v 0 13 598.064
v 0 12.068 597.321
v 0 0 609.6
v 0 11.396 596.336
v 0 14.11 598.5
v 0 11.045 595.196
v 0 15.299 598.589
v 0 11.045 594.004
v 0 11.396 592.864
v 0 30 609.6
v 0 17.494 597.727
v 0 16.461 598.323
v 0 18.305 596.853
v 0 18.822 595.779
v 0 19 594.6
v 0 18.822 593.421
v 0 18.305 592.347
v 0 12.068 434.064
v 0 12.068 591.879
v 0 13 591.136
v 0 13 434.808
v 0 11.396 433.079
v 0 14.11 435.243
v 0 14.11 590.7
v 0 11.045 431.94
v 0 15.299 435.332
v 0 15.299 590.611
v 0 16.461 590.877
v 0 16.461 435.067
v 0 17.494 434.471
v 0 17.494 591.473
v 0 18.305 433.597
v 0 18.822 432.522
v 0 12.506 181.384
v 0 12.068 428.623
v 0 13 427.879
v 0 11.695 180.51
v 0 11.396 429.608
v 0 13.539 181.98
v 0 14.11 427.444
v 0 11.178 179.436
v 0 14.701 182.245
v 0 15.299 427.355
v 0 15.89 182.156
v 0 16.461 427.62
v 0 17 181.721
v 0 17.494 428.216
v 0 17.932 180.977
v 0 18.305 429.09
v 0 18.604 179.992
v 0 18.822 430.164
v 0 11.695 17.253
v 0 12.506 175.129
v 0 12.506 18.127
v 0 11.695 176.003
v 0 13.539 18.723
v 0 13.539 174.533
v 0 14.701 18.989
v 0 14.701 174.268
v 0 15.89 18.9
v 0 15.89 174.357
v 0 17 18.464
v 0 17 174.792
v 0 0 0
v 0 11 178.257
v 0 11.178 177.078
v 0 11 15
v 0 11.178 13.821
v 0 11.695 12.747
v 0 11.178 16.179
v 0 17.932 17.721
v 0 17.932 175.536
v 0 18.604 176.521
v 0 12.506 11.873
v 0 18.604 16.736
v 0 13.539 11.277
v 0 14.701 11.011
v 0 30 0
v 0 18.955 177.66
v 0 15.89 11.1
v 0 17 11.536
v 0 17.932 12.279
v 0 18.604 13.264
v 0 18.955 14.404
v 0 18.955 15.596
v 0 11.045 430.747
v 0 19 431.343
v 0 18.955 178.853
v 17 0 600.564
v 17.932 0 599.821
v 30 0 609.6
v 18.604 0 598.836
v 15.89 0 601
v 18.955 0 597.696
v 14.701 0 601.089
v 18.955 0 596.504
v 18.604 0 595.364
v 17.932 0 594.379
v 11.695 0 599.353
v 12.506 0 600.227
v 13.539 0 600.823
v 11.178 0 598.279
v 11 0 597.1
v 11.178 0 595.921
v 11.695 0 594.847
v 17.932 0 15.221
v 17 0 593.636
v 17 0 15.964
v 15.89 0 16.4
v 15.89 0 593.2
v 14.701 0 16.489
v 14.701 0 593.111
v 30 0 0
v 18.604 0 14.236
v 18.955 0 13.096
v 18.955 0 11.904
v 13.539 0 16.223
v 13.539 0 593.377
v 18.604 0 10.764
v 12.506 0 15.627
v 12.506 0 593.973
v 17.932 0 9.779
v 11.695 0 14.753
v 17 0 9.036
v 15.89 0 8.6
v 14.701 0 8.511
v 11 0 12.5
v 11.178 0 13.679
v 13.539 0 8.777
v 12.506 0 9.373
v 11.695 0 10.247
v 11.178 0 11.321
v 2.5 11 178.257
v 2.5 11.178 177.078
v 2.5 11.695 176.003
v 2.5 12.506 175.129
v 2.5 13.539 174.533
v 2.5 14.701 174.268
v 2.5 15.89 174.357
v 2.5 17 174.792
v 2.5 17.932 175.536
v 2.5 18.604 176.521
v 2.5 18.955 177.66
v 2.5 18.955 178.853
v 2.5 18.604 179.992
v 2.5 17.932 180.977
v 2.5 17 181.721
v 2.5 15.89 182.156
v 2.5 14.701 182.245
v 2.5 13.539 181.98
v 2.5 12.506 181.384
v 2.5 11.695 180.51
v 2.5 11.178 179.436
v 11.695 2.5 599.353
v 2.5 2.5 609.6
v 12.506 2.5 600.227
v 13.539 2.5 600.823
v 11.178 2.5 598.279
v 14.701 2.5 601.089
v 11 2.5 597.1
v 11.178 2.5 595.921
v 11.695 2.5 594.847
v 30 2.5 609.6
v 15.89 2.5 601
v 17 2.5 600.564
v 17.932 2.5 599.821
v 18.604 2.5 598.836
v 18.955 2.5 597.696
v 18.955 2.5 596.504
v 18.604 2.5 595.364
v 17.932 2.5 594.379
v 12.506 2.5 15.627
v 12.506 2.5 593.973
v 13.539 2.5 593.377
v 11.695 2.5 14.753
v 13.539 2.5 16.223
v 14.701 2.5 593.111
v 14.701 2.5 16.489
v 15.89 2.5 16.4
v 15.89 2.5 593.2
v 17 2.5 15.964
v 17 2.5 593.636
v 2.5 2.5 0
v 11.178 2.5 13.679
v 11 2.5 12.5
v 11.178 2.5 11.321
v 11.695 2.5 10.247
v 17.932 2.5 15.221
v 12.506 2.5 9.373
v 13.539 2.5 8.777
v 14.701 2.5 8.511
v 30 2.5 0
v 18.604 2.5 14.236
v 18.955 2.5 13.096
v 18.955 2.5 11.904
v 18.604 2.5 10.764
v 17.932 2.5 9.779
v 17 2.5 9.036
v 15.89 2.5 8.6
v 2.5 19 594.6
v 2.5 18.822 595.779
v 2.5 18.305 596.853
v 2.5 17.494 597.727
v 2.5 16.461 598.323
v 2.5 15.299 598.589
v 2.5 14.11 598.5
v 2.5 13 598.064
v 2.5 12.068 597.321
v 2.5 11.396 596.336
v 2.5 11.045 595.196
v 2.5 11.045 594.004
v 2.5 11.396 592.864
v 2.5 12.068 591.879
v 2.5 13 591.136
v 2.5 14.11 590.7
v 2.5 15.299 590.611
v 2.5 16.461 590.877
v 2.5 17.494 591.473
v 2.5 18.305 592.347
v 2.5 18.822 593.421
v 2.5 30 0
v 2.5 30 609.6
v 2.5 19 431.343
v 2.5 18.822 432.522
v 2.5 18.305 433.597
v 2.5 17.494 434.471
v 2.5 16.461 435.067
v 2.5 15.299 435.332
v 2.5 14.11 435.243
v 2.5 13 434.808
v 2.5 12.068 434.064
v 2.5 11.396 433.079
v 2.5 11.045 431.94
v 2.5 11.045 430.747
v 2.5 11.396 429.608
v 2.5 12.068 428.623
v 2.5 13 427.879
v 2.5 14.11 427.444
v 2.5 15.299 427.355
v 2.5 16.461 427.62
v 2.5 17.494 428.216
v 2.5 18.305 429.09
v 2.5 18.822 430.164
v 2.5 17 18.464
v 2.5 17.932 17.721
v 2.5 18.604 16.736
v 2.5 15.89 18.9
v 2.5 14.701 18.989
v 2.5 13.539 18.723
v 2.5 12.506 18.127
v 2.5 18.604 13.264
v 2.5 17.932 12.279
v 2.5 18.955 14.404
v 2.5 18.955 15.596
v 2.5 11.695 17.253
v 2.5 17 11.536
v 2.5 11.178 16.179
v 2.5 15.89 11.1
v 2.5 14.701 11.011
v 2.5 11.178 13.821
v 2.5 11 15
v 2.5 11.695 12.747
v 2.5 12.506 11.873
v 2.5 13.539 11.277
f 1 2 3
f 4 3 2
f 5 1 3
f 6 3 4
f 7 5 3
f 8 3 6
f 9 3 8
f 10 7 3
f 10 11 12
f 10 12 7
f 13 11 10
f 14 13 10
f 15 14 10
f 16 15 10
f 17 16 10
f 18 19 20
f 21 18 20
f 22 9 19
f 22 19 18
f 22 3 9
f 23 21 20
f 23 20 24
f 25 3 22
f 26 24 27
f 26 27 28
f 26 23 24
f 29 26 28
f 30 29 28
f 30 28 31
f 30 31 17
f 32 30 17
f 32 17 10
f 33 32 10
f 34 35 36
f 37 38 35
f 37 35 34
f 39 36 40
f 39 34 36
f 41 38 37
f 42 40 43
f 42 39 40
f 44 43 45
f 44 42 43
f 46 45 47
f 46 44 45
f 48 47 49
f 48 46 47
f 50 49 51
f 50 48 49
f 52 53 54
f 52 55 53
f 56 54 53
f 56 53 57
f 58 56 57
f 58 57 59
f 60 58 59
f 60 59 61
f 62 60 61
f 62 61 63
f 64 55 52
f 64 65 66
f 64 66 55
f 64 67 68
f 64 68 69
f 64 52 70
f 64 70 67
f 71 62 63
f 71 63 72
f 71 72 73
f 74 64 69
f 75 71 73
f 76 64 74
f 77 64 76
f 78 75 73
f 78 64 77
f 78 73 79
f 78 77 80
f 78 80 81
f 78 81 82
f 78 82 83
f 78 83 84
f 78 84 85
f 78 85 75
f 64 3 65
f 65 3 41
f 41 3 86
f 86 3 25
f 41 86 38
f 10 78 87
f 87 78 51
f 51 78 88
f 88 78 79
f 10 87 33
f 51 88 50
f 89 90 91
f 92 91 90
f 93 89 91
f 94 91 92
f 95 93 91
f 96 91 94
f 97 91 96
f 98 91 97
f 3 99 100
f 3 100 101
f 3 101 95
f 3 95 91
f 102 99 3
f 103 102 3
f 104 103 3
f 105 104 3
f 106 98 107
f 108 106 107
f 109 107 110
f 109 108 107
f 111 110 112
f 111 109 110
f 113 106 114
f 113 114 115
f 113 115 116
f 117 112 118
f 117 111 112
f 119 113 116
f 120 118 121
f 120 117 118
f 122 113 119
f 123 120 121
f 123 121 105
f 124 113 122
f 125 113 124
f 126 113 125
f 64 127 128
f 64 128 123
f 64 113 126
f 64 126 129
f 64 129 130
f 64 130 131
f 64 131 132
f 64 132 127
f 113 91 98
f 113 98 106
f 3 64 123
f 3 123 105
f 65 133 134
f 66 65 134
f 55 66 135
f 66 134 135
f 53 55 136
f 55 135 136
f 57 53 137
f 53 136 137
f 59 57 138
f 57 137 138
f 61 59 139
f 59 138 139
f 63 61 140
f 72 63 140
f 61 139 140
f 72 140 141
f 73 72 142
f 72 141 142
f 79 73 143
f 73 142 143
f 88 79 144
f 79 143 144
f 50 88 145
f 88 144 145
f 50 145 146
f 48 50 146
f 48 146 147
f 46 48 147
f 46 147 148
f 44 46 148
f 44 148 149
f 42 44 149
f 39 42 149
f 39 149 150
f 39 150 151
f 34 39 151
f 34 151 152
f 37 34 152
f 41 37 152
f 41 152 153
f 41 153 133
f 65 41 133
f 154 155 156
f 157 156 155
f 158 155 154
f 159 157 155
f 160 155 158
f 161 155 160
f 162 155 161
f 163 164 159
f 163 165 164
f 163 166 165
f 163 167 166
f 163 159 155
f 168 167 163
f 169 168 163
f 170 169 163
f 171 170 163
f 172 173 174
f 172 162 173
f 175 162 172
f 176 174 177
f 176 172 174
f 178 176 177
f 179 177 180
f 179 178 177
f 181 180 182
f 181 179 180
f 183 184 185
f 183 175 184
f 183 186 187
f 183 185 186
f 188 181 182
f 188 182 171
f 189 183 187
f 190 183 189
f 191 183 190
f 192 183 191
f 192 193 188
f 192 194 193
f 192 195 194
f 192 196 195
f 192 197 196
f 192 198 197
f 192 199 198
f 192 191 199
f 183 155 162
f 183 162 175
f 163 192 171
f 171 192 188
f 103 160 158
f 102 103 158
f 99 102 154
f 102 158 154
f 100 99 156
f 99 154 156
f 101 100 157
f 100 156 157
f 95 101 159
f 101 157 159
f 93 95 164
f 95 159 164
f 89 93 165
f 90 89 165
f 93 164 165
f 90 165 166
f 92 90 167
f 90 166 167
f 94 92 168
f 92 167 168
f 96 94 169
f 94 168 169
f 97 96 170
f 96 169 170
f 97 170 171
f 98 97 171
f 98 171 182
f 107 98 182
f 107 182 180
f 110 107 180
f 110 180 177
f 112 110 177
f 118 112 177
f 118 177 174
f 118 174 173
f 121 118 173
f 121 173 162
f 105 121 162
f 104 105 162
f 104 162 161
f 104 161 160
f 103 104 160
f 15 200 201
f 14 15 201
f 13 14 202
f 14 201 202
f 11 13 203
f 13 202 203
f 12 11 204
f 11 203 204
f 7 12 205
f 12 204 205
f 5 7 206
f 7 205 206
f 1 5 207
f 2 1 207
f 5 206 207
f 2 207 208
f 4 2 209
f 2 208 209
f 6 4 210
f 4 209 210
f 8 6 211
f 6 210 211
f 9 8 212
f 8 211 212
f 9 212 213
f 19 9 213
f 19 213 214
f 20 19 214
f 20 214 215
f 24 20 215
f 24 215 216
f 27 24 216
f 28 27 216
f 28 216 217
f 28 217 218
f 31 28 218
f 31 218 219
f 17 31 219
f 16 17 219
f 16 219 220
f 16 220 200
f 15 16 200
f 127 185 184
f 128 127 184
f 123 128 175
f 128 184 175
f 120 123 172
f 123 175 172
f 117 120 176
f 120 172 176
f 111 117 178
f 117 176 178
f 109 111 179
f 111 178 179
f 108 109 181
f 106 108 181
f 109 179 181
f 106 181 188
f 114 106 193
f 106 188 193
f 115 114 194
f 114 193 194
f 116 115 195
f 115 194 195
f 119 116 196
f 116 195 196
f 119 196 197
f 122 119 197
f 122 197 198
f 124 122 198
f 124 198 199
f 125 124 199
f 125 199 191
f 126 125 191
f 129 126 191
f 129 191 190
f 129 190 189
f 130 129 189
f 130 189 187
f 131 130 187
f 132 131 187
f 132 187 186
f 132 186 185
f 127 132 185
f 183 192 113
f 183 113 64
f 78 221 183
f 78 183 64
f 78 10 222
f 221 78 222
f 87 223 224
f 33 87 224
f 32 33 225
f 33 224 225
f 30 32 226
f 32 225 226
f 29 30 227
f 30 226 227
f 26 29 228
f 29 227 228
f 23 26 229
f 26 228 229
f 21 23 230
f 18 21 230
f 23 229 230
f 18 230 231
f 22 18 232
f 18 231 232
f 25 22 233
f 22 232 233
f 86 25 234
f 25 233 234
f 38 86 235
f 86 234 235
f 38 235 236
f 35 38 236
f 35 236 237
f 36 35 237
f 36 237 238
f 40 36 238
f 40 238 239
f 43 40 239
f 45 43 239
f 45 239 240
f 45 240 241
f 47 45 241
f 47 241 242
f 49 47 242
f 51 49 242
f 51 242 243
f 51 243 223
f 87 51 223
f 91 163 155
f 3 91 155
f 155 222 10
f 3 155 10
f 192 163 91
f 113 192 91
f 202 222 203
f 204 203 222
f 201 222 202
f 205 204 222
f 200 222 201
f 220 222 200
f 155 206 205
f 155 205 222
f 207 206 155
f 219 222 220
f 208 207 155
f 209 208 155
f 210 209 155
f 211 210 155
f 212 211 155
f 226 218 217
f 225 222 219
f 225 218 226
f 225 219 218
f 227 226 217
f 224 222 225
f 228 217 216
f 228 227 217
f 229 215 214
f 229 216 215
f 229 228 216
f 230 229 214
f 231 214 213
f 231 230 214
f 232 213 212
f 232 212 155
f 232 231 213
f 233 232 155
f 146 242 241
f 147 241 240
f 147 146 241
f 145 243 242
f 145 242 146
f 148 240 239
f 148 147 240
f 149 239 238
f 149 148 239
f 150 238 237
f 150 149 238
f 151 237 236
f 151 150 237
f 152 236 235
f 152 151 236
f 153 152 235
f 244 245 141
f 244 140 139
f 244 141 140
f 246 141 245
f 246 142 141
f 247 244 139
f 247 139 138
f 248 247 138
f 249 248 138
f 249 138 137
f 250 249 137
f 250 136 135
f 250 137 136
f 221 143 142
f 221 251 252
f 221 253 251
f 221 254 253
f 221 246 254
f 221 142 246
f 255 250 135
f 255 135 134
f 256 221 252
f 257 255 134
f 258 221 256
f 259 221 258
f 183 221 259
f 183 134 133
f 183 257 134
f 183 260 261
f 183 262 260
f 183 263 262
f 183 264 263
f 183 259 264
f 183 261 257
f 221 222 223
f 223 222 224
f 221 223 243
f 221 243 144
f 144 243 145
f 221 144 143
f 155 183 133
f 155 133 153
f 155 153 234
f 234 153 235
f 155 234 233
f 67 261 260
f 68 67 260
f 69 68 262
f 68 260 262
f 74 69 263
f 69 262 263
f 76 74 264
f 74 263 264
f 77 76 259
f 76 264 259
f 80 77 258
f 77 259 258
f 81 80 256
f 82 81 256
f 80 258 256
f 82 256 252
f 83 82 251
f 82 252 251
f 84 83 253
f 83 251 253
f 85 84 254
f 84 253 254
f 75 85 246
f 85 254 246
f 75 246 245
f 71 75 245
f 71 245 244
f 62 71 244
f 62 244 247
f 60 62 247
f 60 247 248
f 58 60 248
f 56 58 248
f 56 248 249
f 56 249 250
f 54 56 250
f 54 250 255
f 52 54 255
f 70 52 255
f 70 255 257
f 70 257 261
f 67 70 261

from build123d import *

# Parameters (mm, degrees)
BOSS_EXTRUDE1_DEPTH = 609.6
SKETCH2_R           = 4
CUT_EXTRUDE1_DEPTH  = 611.956962478
SKETCH3_R           = 4
CUT_EXTRUDE2_DEPTH  = 611.956962478


with BuildPart() as part:
    # Sketch1 → Boss-Extrude1 (new body)
    with BuildSketch(Plane.XY):
        Polygon((0, 0), (0, 30), (2.5, 30), (2.5, 2.5), (30, 2.5), (30, 0), align=None)
    extrude(amount=BOSS_EXTRUDE1_DEPTH)

    # Sketch2 → Cut-Extrude1 (cut, through all)
    with BuildSketch(Plane(origin=(2.5, 0, 0), x_dir=(0, 0, -1), z_dir=(1, 0, 0))):
        with Locations(Location((-594.6, 15, 0), (0, 0, 90))):
            Circle(SKETCH2_R)
        with Locations(Location((-15, 15, 0), (0, 0, 270))):
            Circle(SKETCH2_R)
        with Locations(Location((-431.3434763, 15, 0), (0, 0, 90))):
            Circle(SKETCH2_R)
        with Locations(Location((-178.2565237, 15, 0), (0, 0, 270))):
            Circle(SKETCH2_R)
    extrude(amount=-CUT_EXTRUDE1_DEPTH, mode=Mode.SUBTRACT)

    # Sketch3 → Cut-Extrude2 (cut, through all)
    with BuildSketch(Plane(origin=(0, 2.5, 0), x_dir=(1, 0, 0), z_dir=(0, 1, 0))):
        with Locations(Location((15, -12.5, 0), (0, 0, 180))):
            Circle(SKETCH3_R)
        with Locations(Location((15, -597.1, 0), (0, 0, 180))):
            Circle(SKETCH3_R)
    extrude(amount=-CUT_EXTRUDE2_DEPTH, mode=Mode.SUBTRACT)


solid = part.part
